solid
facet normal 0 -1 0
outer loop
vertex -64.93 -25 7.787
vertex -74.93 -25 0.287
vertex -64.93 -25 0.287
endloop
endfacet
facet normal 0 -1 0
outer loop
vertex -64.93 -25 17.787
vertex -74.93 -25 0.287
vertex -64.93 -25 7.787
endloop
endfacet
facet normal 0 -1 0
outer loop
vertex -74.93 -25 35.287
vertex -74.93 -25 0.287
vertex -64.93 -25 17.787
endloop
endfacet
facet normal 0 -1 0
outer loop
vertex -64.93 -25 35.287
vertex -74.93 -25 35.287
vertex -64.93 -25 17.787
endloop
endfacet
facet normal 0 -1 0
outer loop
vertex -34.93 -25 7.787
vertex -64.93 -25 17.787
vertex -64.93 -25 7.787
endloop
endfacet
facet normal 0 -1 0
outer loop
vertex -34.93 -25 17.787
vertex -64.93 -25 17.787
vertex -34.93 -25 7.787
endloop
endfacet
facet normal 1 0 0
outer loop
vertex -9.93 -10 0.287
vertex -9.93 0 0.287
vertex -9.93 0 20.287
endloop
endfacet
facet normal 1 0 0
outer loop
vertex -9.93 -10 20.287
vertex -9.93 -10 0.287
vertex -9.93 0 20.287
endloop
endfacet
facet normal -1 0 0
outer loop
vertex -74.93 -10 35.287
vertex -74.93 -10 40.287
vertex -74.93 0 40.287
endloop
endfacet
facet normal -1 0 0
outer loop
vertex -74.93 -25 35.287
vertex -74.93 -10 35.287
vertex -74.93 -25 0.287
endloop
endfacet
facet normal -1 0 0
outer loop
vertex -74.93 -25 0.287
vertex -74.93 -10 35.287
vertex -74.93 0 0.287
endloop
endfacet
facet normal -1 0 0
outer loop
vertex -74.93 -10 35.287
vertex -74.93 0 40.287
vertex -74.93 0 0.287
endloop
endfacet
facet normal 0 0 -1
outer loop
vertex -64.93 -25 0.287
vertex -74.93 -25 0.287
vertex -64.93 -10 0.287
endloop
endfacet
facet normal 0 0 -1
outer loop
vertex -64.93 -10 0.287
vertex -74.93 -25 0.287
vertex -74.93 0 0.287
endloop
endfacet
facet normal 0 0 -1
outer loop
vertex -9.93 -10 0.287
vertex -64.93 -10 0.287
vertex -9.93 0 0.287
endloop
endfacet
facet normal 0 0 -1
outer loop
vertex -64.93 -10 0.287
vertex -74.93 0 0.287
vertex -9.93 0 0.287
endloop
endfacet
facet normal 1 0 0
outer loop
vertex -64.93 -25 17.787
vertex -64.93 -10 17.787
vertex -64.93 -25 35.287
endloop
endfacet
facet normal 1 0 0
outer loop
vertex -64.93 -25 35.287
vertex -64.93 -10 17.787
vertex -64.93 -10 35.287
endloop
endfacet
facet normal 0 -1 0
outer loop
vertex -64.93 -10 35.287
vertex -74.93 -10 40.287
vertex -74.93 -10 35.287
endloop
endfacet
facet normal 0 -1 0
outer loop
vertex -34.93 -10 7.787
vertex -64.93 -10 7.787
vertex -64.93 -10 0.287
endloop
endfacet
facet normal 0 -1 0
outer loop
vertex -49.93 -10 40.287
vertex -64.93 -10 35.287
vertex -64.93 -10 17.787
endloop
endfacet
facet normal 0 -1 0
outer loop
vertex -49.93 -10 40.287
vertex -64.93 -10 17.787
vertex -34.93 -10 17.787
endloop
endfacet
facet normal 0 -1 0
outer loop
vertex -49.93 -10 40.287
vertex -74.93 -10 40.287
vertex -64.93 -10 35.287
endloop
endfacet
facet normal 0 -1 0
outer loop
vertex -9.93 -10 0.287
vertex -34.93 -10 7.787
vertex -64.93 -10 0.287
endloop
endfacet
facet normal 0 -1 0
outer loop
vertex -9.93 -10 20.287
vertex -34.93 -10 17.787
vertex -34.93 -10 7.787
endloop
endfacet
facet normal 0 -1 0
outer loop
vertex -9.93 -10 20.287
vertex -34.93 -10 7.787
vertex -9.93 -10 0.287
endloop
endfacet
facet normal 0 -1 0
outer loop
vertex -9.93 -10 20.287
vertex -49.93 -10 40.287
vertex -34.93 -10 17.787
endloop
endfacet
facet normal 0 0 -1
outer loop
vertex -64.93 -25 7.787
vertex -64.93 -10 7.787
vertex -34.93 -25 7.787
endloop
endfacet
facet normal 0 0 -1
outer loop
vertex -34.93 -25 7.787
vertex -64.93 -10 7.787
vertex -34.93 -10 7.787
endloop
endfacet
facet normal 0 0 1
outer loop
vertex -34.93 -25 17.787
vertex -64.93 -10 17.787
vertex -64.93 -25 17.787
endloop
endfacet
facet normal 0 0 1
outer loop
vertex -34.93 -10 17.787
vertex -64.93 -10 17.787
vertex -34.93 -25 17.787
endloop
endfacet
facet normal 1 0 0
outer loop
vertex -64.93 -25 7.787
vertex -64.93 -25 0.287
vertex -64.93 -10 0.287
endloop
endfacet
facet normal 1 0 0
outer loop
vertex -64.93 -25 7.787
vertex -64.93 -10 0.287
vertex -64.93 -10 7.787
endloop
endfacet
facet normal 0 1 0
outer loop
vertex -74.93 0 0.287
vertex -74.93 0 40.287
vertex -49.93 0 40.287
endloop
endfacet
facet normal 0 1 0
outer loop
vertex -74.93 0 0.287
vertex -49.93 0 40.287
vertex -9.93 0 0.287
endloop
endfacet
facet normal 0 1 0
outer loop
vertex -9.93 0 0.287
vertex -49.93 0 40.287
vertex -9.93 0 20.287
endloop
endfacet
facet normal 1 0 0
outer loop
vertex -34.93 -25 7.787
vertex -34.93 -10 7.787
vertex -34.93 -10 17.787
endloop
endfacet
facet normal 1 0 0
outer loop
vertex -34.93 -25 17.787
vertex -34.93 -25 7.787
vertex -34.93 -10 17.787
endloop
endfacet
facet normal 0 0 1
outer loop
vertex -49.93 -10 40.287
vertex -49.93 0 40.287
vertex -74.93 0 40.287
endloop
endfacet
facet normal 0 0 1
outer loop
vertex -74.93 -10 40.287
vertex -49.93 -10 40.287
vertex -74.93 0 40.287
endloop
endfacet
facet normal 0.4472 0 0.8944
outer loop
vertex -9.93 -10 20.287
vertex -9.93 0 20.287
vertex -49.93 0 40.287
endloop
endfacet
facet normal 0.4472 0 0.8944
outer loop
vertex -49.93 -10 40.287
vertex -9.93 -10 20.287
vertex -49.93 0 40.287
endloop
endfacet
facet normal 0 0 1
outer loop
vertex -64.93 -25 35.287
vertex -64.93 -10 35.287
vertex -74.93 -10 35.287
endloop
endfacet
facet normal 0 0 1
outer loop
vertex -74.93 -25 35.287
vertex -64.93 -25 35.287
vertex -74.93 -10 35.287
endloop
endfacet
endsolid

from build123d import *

# Parameters (mm, degrees)
F1_DEPTH = 25
F2_DEPTH = 10
F0_W     = 30
F0_H     = 10
F3_DEPTH = 25


with BuildPart() as f1:
    # F0 (on Front) → F1 (new body)
    with BuildSketch(Plane.XZ):
        Polygon((-64.929679, 35.287431), (-74.929679, 35.287431), (-74.929679, 0.287431), (-64.929679, 0.287431), (-64.929679, 7.787431), (-64.929679, 17.787431), align=None)
    extrude(amount=F1_DEPTH)

    # F0 (on Front) → F2 (join)
    with BuildSketch(Plane.XZ):
        Polygon((-74.929679, 40.287431), (-74.929679, 35.287431), (-64.929679, 35.287431), (-64.929679, 17.787431), (-34.929679, 17.787431), (-34.929679, 7.787431), (-64.929679, 7.787431), (-64.929679, 0.287431), (-9.929679, 0.287431), (-9.929679, 20.287431), (-49.929679, 40.287431), align=None)
    extrude(amount=F2_DEPTH)

    # F0 (on Front) → F3 (join)
    with BuildSketch(Plane.XZ):
        with Locations((-49.929679, 12.787431)):
            Rectangle(F0_W, F0_H)
    extrude(amount=F3_DEPTH)


solid = f1.part
